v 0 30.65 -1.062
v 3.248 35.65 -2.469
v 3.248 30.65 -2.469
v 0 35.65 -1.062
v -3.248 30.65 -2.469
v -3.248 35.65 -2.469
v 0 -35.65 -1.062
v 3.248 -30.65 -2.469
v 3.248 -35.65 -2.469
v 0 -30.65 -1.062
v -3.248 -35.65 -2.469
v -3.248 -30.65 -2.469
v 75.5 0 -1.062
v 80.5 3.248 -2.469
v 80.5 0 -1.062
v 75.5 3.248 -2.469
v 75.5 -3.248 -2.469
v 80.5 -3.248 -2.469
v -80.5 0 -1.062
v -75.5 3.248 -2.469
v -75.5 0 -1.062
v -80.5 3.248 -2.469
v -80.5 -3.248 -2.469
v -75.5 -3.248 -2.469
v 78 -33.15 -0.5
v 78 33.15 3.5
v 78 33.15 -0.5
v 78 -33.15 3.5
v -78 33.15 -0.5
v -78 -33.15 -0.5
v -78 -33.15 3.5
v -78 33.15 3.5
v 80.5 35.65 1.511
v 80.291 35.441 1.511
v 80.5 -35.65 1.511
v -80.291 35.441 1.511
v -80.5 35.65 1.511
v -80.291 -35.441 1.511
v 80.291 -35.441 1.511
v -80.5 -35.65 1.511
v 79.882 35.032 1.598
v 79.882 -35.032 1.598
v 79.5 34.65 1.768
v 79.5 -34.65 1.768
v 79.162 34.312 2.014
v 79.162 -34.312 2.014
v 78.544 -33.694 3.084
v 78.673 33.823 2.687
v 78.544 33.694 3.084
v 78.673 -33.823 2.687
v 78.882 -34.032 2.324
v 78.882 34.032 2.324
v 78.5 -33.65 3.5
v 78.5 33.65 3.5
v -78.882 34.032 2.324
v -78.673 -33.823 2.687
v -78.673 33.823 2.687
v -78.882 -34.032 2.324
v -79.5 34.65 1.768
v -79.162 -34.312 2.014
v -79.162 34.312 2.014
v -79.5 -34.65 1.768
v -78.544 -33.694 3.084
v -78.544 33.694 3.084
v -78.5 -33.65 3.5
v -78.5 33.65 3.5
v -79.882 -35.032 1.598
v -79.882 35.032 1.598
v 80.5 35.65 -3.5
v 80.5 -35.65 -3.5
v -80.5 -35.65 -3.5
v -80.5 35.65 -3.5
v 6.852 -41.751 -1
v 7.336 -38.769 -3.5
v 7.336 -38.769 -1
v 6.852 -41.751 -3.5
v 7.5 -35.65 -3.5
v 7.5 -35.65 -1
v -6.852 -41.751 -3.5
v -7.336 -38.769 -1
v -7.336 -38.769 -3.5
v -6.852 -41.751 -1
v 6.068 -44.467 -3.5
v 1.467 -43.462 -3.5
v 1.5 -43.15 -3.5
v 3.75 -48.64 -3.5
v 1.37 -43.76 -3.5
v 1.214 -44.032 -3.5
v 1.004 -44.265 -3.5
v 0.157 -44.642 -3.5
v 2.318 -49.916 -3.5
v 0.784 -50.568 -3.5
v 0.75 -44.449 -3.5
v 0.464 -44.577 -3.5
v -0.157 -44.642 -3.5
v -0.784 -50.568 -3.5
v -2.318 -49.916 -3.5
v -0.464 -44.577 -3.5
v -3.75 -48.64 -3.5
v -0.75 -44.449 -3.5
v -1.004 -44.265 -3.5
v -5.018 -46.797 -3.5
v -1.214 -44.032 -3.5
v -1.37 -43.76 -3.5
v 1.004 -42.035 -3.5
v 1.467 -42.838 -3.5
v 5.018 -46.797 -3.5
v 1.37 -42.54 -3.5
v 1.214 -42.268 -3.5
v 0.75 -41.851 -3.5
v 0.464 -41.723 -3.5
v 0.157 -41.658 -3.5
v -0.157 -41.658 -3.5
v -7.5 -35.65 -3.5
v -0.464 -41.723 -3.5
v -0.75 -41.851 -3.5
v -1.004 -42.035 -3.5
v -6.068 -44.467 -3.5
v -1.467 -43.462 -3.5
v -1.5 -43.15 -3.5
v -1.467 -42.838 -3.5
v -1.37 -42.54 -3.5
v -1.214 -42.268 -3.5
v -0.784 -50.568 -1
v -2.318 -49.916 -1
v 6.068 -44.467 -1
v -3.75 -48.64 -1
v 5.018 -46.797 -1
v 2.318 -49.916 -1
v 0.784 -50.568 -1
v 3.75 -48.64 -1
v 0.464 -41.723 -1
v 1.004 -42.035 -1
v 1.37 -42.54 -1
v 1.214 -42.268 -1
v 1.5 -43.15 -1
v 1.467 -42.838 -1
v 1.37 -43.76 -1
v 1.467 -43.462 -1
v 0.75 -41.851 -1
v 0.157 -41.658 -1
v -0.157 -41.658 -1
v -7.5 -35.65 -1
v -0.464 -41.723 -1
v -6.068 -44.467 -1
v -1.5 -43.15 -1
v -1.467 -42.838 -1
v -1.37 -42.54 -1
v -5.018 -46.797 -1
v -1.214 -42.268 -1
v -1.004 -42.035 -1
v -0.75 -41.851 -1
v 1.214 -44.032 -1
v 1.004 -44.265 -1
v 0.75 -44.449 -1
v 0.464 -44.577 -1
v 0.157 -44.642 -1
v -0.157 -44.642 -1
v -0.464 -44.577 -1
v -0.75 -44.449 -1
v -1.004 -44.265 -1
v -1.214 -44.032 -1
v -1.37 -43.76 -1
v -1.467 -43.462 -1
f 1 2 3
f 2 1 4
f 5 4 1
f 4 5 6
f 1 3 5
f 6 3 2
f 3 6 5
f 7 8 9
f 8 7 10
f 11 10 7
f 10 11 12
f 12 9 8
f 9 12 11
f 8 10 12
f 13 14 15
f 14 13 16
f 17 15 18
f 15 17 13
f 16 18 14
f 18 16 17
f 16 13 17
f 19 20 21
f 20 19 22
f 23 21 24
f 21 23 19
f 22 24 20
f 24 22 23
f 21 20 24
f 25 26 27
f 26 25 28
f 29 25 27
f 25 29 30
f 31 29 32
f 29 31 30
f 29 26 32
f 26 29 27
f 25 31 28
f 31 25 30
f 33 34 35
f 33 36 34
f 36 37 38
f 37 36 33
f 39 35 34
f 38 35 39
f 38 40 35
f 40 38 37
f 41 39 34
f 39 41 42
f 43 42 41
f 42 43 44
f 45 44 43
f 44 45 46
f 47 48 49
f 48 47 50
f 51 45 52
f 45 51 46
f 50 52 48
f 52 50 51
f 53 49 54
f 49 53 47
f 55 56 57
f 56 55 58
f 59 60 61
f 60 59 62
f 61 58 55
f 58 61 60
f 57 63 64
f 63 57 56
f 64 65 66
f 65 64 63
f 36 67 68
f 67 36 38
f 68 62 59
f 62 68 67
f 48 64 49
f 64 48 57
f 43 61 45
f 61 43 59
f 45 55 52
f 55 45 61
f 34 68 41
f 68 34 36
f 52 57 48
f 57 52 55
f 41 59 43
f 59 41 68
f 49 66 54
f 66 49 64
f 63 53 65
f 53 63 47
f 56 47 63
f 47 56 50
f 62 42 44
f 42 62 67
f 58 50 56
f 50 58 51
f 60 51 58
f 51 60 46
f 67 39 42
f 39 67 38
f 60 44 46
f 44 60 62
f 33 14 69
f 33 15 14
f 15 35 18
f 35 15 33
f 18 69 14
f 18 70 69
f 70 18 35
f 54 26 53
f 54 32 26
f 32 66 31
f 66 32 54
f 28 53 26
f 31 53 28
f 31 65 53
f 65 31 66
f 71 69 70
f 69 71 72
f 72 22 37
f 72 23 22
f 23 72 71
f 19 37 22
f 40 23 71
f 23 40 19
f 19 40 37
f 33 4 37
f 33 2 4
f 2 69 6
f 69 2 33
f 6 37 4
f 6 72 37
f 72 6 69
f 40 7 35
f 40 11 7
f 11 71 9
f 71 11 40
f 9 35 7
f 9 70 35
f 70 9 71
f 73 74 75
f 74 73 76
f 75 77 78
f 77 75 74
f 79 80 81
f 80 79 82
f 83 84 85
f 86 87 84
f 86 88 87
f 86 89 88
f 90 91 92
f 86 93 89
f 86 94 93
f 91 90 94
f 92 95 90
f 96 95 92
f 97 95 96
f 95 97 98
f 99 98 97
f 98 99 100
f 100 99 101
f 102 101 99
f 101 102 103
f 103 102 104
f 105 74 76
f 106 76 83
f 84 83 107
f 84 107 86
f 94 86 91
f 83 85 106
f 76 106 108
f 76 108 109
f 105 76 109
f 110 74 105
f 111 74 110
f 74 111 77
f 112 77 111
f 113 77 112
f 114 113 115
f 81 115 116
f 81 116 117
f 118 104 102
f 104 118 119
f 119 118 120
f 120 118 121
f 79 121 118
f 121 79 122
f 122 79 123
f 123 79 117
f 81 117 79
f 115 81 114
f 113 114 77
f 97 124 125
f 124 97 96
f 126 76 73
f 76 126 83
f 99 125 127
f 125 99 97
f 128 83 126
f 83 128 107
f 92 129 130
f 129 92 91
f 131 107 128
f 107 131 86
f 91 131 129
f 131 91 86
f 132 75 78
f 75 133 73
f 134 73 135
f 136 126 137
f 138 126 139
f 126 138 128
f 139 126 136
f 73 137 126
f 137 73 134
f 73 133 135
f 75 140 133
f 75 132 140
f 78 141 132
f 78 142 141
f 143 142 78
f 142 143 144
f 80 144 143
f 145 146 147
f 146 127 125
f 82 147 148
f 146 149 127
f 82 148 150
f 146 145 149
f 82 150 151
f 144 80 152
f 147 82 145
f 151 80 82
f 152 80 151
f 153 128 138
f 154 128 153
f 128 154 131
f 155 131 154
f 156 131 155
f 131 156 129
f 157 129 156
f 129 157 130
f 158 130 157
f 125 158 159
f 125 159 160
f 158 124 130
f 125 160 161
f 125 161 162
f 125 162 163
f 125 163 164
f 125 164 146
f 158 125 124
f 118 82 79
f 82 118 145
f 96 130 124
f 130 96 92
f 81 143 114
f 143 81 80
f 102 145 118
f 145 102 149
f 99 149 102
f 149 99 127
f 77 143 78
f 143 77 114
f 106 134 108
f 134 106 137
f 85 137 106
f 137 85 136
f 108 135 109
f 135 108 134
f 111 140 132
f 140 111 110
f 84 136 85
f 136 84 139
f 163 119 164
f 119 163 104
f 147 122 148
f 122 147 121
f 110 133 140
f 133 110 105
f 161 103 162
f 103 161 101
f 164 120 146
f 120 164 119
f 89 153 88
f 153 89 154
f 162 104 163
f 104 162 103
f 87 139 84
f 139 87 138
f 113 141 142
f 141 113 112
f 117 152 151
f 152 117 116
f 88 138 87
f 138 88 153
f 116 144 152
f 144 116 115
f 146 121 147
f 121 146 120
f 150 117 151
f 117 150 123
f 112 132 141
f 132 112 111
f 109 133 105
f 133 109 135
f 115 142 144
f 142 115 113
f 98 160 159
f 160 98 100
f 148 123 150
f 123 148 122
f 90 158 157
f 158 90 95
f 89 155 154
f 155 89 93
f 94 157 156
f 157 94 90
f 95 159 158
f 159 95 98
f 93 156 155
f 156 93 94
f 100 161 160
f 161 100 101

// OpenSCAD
//------------------Variables------------------\\ 

		//----Global Values----\\
			//The default unit in OpenSCAD is mm and this unit variable allows one to change the variables in the code with units other than mm. Default is 1, for mm, but cm is 10 and inches is 25.4.
				unit=1;

			//The detail in the cylinders/spheres of the shape.
				sfn=30;

		//----Bill Specifics----\\

			//The length of the bill.
				billength= 156;

			//The width of the bill. 
				billwidth = 66.3;

			//The thickness of the frame. 
				framethick = 5;
			
			//Bottom Thickness
				botthick = 2 ;

		//----Frame Specifics----\\

			//The border of the frame length-wise. This is the measurement from the inside of the frame to the outisde on the length (x) axis. The cylinders that shape the frame use this measurement.
				xframe = 5;

			//The border of the frame width-wise. This is the measurement from the inside of the frame to the outisde on the width (y) axis.
				yframe = 5;
		
			//How prominent the frame shaping is. Play with this value. Default is 2.
				frameshapethick = 1.25;

			//How raised the frame shaping is. Play with this value as well. 
				frameshaperaise = 1;
		
	//----Paper clip slit size----\\\
		//Width of the paperclip slit. Adjust this value if as you want. 
		slitwidth = 10;
		
		//Height of the slit. This is actually a size control but it mainly changes the size.
		slitheight = 7.5;

		//Where the slit is. Slit is in the middle by default but depending on size you may have to raise or lower this value.
		slitlift =-4;

		//Shape of slit in sides. Default is 3 (triangle) as its overhangs are not unbearable.
		slitshape=3;

		//Slit scale (x,y,z)
		slitscalex= 0.25;
		slitscaley= 1;
		slitscalez= 1;
	
	//----Hook sizing----\\
		//Hook size
		hooksize=15;

		//Hook hole size
		hookhole=3;

		//Hook thickness
		hookthick=2.5;

//-------------------Modules-------------------\\ 

	//----Basic Frame Shapes----\\
		module bill() {
			cube([billength*unit, billwidth*unit,framethick*unit], center=true);
		}

		module outsideframe() { 
			cube([(billength+xframe)*unit, (billwidth+yframe)*unit, (framethick+botthick)*unit], center=true);
		}

	//----Frame shaping.----\\
		//Frame shaping cylinder on the X Axis.
			module xfsc() {
				cylinder(r=(framethick*unit)/(frameshapethick*2), h=(billwidth+yframe)*unit+xframe, center=true, $fn=sfn);
			}

		//Frame shaping cylinder on the Y Axis.
			module yfsc() {
				cylinder(r=(framethick*unit)/(frameshapethick*2), h=(billength+xframe)*unit+yframe, center=true, $fn=sfn);
			}

		//Frameshaping general module
			module frameshaping() {
				translate([(billength/2)*unit+xframe/2, 0, (framethick/2)*unit]) {
					rotate([90,0,0]) {
						xfsc();
					}
				}
				translate([(-billength/2)*unit-xframe/2, 0, (framethick/2)*unit]) {
					rotate([90,0,0]) {
						xfsc();
					}
				}

				translate([0, (billwidth/2)*unit+yframe/2, (framethick/2)*unit]) {
					rotate([90,0,90]) {
						yfsc();
					}
				}
				translate([0, (-billwidth/2)*unit-yframe/2, (framethick/2)*unit]) {
					rotate([90,0,90]) {
						yfsc();
					}
				}
			}

	



	//A slit on every side for a paper clip to hold it down
	module clipslit() {
		translate([0, ((billwidth+yframe)/2)*unit, slitlift*unit]) {
			rotate([0,270,90]) {
				scale([slitscalex,slitscaley,slitscalez]) {
					cylinder(r=(slitheight/2)*unit, h=slitwidth*unit, $fn=slitshape, center=true);
				}
			}
		}
		translate([0, ((billwidth+yframe)/2)*-unit, slitlift*unit]) {
			rotate([0,270,90]) {
				scale([slitscalex,slitscaley,slitscalez]) {
					cylinder(r=(slitheight/2)*unit, h=slitwidth*unit, $fn=slitshape, center=true);
				}
			}
		}
		translate([((billength+xframe)/2)*unit, 0, slitlift*unit]) {
			rotate([0,270,0]) {
				scale([slitscalex,slitscaley,slitscalez]) {
					cylinder(r=(slitheight/2)*unit, h=slitwidth*unit, $fn=slitshape, center=true);
				}
			}
		}
		translate([-unit*((billength+xframe)/2), 0, slitlift*unit]) {
			rotate([0,270,0]) {
				scale([slitscalex,slitscaley,slitscalez]) {
					cylinder(r=(slitheight/2)*unit, h=slitwidth*unit, $fn=slitshape, center=true);
				}
			}
		}				
	}

		
	module hook() {
		translate([0,-((billwidth+xframe)/2)*unit, (-(framethick+botthick)/2)*unit ]) {
			difference() {
				scale([1,2,1]) {
					cylinder(r=(hooksize/2)*unit, h=hookthick*unit, $fn=sfn);
				}
				translate([(-hooksize/2)*unit, 0]) {
					cube([hooksize*unit, hooksize*unit, hookthick*unit]);
				}
				translate([0, (-hooksize/2)*unit, 0]) {
					cylinder(r=(hookhole/2)*unit, h=hookthick*unit, $fn=sfn);
				}
			}
		}
	}


	//Plating module
	module frame() {
		difference() {
			outsideframe();
			translate([0,0, botthick]) {
				bill();
				clipslit();
			}
			translate([0,0, frameshaperaise]) {
				frameshaping();
			}
		}
	}

frame();
hook();
